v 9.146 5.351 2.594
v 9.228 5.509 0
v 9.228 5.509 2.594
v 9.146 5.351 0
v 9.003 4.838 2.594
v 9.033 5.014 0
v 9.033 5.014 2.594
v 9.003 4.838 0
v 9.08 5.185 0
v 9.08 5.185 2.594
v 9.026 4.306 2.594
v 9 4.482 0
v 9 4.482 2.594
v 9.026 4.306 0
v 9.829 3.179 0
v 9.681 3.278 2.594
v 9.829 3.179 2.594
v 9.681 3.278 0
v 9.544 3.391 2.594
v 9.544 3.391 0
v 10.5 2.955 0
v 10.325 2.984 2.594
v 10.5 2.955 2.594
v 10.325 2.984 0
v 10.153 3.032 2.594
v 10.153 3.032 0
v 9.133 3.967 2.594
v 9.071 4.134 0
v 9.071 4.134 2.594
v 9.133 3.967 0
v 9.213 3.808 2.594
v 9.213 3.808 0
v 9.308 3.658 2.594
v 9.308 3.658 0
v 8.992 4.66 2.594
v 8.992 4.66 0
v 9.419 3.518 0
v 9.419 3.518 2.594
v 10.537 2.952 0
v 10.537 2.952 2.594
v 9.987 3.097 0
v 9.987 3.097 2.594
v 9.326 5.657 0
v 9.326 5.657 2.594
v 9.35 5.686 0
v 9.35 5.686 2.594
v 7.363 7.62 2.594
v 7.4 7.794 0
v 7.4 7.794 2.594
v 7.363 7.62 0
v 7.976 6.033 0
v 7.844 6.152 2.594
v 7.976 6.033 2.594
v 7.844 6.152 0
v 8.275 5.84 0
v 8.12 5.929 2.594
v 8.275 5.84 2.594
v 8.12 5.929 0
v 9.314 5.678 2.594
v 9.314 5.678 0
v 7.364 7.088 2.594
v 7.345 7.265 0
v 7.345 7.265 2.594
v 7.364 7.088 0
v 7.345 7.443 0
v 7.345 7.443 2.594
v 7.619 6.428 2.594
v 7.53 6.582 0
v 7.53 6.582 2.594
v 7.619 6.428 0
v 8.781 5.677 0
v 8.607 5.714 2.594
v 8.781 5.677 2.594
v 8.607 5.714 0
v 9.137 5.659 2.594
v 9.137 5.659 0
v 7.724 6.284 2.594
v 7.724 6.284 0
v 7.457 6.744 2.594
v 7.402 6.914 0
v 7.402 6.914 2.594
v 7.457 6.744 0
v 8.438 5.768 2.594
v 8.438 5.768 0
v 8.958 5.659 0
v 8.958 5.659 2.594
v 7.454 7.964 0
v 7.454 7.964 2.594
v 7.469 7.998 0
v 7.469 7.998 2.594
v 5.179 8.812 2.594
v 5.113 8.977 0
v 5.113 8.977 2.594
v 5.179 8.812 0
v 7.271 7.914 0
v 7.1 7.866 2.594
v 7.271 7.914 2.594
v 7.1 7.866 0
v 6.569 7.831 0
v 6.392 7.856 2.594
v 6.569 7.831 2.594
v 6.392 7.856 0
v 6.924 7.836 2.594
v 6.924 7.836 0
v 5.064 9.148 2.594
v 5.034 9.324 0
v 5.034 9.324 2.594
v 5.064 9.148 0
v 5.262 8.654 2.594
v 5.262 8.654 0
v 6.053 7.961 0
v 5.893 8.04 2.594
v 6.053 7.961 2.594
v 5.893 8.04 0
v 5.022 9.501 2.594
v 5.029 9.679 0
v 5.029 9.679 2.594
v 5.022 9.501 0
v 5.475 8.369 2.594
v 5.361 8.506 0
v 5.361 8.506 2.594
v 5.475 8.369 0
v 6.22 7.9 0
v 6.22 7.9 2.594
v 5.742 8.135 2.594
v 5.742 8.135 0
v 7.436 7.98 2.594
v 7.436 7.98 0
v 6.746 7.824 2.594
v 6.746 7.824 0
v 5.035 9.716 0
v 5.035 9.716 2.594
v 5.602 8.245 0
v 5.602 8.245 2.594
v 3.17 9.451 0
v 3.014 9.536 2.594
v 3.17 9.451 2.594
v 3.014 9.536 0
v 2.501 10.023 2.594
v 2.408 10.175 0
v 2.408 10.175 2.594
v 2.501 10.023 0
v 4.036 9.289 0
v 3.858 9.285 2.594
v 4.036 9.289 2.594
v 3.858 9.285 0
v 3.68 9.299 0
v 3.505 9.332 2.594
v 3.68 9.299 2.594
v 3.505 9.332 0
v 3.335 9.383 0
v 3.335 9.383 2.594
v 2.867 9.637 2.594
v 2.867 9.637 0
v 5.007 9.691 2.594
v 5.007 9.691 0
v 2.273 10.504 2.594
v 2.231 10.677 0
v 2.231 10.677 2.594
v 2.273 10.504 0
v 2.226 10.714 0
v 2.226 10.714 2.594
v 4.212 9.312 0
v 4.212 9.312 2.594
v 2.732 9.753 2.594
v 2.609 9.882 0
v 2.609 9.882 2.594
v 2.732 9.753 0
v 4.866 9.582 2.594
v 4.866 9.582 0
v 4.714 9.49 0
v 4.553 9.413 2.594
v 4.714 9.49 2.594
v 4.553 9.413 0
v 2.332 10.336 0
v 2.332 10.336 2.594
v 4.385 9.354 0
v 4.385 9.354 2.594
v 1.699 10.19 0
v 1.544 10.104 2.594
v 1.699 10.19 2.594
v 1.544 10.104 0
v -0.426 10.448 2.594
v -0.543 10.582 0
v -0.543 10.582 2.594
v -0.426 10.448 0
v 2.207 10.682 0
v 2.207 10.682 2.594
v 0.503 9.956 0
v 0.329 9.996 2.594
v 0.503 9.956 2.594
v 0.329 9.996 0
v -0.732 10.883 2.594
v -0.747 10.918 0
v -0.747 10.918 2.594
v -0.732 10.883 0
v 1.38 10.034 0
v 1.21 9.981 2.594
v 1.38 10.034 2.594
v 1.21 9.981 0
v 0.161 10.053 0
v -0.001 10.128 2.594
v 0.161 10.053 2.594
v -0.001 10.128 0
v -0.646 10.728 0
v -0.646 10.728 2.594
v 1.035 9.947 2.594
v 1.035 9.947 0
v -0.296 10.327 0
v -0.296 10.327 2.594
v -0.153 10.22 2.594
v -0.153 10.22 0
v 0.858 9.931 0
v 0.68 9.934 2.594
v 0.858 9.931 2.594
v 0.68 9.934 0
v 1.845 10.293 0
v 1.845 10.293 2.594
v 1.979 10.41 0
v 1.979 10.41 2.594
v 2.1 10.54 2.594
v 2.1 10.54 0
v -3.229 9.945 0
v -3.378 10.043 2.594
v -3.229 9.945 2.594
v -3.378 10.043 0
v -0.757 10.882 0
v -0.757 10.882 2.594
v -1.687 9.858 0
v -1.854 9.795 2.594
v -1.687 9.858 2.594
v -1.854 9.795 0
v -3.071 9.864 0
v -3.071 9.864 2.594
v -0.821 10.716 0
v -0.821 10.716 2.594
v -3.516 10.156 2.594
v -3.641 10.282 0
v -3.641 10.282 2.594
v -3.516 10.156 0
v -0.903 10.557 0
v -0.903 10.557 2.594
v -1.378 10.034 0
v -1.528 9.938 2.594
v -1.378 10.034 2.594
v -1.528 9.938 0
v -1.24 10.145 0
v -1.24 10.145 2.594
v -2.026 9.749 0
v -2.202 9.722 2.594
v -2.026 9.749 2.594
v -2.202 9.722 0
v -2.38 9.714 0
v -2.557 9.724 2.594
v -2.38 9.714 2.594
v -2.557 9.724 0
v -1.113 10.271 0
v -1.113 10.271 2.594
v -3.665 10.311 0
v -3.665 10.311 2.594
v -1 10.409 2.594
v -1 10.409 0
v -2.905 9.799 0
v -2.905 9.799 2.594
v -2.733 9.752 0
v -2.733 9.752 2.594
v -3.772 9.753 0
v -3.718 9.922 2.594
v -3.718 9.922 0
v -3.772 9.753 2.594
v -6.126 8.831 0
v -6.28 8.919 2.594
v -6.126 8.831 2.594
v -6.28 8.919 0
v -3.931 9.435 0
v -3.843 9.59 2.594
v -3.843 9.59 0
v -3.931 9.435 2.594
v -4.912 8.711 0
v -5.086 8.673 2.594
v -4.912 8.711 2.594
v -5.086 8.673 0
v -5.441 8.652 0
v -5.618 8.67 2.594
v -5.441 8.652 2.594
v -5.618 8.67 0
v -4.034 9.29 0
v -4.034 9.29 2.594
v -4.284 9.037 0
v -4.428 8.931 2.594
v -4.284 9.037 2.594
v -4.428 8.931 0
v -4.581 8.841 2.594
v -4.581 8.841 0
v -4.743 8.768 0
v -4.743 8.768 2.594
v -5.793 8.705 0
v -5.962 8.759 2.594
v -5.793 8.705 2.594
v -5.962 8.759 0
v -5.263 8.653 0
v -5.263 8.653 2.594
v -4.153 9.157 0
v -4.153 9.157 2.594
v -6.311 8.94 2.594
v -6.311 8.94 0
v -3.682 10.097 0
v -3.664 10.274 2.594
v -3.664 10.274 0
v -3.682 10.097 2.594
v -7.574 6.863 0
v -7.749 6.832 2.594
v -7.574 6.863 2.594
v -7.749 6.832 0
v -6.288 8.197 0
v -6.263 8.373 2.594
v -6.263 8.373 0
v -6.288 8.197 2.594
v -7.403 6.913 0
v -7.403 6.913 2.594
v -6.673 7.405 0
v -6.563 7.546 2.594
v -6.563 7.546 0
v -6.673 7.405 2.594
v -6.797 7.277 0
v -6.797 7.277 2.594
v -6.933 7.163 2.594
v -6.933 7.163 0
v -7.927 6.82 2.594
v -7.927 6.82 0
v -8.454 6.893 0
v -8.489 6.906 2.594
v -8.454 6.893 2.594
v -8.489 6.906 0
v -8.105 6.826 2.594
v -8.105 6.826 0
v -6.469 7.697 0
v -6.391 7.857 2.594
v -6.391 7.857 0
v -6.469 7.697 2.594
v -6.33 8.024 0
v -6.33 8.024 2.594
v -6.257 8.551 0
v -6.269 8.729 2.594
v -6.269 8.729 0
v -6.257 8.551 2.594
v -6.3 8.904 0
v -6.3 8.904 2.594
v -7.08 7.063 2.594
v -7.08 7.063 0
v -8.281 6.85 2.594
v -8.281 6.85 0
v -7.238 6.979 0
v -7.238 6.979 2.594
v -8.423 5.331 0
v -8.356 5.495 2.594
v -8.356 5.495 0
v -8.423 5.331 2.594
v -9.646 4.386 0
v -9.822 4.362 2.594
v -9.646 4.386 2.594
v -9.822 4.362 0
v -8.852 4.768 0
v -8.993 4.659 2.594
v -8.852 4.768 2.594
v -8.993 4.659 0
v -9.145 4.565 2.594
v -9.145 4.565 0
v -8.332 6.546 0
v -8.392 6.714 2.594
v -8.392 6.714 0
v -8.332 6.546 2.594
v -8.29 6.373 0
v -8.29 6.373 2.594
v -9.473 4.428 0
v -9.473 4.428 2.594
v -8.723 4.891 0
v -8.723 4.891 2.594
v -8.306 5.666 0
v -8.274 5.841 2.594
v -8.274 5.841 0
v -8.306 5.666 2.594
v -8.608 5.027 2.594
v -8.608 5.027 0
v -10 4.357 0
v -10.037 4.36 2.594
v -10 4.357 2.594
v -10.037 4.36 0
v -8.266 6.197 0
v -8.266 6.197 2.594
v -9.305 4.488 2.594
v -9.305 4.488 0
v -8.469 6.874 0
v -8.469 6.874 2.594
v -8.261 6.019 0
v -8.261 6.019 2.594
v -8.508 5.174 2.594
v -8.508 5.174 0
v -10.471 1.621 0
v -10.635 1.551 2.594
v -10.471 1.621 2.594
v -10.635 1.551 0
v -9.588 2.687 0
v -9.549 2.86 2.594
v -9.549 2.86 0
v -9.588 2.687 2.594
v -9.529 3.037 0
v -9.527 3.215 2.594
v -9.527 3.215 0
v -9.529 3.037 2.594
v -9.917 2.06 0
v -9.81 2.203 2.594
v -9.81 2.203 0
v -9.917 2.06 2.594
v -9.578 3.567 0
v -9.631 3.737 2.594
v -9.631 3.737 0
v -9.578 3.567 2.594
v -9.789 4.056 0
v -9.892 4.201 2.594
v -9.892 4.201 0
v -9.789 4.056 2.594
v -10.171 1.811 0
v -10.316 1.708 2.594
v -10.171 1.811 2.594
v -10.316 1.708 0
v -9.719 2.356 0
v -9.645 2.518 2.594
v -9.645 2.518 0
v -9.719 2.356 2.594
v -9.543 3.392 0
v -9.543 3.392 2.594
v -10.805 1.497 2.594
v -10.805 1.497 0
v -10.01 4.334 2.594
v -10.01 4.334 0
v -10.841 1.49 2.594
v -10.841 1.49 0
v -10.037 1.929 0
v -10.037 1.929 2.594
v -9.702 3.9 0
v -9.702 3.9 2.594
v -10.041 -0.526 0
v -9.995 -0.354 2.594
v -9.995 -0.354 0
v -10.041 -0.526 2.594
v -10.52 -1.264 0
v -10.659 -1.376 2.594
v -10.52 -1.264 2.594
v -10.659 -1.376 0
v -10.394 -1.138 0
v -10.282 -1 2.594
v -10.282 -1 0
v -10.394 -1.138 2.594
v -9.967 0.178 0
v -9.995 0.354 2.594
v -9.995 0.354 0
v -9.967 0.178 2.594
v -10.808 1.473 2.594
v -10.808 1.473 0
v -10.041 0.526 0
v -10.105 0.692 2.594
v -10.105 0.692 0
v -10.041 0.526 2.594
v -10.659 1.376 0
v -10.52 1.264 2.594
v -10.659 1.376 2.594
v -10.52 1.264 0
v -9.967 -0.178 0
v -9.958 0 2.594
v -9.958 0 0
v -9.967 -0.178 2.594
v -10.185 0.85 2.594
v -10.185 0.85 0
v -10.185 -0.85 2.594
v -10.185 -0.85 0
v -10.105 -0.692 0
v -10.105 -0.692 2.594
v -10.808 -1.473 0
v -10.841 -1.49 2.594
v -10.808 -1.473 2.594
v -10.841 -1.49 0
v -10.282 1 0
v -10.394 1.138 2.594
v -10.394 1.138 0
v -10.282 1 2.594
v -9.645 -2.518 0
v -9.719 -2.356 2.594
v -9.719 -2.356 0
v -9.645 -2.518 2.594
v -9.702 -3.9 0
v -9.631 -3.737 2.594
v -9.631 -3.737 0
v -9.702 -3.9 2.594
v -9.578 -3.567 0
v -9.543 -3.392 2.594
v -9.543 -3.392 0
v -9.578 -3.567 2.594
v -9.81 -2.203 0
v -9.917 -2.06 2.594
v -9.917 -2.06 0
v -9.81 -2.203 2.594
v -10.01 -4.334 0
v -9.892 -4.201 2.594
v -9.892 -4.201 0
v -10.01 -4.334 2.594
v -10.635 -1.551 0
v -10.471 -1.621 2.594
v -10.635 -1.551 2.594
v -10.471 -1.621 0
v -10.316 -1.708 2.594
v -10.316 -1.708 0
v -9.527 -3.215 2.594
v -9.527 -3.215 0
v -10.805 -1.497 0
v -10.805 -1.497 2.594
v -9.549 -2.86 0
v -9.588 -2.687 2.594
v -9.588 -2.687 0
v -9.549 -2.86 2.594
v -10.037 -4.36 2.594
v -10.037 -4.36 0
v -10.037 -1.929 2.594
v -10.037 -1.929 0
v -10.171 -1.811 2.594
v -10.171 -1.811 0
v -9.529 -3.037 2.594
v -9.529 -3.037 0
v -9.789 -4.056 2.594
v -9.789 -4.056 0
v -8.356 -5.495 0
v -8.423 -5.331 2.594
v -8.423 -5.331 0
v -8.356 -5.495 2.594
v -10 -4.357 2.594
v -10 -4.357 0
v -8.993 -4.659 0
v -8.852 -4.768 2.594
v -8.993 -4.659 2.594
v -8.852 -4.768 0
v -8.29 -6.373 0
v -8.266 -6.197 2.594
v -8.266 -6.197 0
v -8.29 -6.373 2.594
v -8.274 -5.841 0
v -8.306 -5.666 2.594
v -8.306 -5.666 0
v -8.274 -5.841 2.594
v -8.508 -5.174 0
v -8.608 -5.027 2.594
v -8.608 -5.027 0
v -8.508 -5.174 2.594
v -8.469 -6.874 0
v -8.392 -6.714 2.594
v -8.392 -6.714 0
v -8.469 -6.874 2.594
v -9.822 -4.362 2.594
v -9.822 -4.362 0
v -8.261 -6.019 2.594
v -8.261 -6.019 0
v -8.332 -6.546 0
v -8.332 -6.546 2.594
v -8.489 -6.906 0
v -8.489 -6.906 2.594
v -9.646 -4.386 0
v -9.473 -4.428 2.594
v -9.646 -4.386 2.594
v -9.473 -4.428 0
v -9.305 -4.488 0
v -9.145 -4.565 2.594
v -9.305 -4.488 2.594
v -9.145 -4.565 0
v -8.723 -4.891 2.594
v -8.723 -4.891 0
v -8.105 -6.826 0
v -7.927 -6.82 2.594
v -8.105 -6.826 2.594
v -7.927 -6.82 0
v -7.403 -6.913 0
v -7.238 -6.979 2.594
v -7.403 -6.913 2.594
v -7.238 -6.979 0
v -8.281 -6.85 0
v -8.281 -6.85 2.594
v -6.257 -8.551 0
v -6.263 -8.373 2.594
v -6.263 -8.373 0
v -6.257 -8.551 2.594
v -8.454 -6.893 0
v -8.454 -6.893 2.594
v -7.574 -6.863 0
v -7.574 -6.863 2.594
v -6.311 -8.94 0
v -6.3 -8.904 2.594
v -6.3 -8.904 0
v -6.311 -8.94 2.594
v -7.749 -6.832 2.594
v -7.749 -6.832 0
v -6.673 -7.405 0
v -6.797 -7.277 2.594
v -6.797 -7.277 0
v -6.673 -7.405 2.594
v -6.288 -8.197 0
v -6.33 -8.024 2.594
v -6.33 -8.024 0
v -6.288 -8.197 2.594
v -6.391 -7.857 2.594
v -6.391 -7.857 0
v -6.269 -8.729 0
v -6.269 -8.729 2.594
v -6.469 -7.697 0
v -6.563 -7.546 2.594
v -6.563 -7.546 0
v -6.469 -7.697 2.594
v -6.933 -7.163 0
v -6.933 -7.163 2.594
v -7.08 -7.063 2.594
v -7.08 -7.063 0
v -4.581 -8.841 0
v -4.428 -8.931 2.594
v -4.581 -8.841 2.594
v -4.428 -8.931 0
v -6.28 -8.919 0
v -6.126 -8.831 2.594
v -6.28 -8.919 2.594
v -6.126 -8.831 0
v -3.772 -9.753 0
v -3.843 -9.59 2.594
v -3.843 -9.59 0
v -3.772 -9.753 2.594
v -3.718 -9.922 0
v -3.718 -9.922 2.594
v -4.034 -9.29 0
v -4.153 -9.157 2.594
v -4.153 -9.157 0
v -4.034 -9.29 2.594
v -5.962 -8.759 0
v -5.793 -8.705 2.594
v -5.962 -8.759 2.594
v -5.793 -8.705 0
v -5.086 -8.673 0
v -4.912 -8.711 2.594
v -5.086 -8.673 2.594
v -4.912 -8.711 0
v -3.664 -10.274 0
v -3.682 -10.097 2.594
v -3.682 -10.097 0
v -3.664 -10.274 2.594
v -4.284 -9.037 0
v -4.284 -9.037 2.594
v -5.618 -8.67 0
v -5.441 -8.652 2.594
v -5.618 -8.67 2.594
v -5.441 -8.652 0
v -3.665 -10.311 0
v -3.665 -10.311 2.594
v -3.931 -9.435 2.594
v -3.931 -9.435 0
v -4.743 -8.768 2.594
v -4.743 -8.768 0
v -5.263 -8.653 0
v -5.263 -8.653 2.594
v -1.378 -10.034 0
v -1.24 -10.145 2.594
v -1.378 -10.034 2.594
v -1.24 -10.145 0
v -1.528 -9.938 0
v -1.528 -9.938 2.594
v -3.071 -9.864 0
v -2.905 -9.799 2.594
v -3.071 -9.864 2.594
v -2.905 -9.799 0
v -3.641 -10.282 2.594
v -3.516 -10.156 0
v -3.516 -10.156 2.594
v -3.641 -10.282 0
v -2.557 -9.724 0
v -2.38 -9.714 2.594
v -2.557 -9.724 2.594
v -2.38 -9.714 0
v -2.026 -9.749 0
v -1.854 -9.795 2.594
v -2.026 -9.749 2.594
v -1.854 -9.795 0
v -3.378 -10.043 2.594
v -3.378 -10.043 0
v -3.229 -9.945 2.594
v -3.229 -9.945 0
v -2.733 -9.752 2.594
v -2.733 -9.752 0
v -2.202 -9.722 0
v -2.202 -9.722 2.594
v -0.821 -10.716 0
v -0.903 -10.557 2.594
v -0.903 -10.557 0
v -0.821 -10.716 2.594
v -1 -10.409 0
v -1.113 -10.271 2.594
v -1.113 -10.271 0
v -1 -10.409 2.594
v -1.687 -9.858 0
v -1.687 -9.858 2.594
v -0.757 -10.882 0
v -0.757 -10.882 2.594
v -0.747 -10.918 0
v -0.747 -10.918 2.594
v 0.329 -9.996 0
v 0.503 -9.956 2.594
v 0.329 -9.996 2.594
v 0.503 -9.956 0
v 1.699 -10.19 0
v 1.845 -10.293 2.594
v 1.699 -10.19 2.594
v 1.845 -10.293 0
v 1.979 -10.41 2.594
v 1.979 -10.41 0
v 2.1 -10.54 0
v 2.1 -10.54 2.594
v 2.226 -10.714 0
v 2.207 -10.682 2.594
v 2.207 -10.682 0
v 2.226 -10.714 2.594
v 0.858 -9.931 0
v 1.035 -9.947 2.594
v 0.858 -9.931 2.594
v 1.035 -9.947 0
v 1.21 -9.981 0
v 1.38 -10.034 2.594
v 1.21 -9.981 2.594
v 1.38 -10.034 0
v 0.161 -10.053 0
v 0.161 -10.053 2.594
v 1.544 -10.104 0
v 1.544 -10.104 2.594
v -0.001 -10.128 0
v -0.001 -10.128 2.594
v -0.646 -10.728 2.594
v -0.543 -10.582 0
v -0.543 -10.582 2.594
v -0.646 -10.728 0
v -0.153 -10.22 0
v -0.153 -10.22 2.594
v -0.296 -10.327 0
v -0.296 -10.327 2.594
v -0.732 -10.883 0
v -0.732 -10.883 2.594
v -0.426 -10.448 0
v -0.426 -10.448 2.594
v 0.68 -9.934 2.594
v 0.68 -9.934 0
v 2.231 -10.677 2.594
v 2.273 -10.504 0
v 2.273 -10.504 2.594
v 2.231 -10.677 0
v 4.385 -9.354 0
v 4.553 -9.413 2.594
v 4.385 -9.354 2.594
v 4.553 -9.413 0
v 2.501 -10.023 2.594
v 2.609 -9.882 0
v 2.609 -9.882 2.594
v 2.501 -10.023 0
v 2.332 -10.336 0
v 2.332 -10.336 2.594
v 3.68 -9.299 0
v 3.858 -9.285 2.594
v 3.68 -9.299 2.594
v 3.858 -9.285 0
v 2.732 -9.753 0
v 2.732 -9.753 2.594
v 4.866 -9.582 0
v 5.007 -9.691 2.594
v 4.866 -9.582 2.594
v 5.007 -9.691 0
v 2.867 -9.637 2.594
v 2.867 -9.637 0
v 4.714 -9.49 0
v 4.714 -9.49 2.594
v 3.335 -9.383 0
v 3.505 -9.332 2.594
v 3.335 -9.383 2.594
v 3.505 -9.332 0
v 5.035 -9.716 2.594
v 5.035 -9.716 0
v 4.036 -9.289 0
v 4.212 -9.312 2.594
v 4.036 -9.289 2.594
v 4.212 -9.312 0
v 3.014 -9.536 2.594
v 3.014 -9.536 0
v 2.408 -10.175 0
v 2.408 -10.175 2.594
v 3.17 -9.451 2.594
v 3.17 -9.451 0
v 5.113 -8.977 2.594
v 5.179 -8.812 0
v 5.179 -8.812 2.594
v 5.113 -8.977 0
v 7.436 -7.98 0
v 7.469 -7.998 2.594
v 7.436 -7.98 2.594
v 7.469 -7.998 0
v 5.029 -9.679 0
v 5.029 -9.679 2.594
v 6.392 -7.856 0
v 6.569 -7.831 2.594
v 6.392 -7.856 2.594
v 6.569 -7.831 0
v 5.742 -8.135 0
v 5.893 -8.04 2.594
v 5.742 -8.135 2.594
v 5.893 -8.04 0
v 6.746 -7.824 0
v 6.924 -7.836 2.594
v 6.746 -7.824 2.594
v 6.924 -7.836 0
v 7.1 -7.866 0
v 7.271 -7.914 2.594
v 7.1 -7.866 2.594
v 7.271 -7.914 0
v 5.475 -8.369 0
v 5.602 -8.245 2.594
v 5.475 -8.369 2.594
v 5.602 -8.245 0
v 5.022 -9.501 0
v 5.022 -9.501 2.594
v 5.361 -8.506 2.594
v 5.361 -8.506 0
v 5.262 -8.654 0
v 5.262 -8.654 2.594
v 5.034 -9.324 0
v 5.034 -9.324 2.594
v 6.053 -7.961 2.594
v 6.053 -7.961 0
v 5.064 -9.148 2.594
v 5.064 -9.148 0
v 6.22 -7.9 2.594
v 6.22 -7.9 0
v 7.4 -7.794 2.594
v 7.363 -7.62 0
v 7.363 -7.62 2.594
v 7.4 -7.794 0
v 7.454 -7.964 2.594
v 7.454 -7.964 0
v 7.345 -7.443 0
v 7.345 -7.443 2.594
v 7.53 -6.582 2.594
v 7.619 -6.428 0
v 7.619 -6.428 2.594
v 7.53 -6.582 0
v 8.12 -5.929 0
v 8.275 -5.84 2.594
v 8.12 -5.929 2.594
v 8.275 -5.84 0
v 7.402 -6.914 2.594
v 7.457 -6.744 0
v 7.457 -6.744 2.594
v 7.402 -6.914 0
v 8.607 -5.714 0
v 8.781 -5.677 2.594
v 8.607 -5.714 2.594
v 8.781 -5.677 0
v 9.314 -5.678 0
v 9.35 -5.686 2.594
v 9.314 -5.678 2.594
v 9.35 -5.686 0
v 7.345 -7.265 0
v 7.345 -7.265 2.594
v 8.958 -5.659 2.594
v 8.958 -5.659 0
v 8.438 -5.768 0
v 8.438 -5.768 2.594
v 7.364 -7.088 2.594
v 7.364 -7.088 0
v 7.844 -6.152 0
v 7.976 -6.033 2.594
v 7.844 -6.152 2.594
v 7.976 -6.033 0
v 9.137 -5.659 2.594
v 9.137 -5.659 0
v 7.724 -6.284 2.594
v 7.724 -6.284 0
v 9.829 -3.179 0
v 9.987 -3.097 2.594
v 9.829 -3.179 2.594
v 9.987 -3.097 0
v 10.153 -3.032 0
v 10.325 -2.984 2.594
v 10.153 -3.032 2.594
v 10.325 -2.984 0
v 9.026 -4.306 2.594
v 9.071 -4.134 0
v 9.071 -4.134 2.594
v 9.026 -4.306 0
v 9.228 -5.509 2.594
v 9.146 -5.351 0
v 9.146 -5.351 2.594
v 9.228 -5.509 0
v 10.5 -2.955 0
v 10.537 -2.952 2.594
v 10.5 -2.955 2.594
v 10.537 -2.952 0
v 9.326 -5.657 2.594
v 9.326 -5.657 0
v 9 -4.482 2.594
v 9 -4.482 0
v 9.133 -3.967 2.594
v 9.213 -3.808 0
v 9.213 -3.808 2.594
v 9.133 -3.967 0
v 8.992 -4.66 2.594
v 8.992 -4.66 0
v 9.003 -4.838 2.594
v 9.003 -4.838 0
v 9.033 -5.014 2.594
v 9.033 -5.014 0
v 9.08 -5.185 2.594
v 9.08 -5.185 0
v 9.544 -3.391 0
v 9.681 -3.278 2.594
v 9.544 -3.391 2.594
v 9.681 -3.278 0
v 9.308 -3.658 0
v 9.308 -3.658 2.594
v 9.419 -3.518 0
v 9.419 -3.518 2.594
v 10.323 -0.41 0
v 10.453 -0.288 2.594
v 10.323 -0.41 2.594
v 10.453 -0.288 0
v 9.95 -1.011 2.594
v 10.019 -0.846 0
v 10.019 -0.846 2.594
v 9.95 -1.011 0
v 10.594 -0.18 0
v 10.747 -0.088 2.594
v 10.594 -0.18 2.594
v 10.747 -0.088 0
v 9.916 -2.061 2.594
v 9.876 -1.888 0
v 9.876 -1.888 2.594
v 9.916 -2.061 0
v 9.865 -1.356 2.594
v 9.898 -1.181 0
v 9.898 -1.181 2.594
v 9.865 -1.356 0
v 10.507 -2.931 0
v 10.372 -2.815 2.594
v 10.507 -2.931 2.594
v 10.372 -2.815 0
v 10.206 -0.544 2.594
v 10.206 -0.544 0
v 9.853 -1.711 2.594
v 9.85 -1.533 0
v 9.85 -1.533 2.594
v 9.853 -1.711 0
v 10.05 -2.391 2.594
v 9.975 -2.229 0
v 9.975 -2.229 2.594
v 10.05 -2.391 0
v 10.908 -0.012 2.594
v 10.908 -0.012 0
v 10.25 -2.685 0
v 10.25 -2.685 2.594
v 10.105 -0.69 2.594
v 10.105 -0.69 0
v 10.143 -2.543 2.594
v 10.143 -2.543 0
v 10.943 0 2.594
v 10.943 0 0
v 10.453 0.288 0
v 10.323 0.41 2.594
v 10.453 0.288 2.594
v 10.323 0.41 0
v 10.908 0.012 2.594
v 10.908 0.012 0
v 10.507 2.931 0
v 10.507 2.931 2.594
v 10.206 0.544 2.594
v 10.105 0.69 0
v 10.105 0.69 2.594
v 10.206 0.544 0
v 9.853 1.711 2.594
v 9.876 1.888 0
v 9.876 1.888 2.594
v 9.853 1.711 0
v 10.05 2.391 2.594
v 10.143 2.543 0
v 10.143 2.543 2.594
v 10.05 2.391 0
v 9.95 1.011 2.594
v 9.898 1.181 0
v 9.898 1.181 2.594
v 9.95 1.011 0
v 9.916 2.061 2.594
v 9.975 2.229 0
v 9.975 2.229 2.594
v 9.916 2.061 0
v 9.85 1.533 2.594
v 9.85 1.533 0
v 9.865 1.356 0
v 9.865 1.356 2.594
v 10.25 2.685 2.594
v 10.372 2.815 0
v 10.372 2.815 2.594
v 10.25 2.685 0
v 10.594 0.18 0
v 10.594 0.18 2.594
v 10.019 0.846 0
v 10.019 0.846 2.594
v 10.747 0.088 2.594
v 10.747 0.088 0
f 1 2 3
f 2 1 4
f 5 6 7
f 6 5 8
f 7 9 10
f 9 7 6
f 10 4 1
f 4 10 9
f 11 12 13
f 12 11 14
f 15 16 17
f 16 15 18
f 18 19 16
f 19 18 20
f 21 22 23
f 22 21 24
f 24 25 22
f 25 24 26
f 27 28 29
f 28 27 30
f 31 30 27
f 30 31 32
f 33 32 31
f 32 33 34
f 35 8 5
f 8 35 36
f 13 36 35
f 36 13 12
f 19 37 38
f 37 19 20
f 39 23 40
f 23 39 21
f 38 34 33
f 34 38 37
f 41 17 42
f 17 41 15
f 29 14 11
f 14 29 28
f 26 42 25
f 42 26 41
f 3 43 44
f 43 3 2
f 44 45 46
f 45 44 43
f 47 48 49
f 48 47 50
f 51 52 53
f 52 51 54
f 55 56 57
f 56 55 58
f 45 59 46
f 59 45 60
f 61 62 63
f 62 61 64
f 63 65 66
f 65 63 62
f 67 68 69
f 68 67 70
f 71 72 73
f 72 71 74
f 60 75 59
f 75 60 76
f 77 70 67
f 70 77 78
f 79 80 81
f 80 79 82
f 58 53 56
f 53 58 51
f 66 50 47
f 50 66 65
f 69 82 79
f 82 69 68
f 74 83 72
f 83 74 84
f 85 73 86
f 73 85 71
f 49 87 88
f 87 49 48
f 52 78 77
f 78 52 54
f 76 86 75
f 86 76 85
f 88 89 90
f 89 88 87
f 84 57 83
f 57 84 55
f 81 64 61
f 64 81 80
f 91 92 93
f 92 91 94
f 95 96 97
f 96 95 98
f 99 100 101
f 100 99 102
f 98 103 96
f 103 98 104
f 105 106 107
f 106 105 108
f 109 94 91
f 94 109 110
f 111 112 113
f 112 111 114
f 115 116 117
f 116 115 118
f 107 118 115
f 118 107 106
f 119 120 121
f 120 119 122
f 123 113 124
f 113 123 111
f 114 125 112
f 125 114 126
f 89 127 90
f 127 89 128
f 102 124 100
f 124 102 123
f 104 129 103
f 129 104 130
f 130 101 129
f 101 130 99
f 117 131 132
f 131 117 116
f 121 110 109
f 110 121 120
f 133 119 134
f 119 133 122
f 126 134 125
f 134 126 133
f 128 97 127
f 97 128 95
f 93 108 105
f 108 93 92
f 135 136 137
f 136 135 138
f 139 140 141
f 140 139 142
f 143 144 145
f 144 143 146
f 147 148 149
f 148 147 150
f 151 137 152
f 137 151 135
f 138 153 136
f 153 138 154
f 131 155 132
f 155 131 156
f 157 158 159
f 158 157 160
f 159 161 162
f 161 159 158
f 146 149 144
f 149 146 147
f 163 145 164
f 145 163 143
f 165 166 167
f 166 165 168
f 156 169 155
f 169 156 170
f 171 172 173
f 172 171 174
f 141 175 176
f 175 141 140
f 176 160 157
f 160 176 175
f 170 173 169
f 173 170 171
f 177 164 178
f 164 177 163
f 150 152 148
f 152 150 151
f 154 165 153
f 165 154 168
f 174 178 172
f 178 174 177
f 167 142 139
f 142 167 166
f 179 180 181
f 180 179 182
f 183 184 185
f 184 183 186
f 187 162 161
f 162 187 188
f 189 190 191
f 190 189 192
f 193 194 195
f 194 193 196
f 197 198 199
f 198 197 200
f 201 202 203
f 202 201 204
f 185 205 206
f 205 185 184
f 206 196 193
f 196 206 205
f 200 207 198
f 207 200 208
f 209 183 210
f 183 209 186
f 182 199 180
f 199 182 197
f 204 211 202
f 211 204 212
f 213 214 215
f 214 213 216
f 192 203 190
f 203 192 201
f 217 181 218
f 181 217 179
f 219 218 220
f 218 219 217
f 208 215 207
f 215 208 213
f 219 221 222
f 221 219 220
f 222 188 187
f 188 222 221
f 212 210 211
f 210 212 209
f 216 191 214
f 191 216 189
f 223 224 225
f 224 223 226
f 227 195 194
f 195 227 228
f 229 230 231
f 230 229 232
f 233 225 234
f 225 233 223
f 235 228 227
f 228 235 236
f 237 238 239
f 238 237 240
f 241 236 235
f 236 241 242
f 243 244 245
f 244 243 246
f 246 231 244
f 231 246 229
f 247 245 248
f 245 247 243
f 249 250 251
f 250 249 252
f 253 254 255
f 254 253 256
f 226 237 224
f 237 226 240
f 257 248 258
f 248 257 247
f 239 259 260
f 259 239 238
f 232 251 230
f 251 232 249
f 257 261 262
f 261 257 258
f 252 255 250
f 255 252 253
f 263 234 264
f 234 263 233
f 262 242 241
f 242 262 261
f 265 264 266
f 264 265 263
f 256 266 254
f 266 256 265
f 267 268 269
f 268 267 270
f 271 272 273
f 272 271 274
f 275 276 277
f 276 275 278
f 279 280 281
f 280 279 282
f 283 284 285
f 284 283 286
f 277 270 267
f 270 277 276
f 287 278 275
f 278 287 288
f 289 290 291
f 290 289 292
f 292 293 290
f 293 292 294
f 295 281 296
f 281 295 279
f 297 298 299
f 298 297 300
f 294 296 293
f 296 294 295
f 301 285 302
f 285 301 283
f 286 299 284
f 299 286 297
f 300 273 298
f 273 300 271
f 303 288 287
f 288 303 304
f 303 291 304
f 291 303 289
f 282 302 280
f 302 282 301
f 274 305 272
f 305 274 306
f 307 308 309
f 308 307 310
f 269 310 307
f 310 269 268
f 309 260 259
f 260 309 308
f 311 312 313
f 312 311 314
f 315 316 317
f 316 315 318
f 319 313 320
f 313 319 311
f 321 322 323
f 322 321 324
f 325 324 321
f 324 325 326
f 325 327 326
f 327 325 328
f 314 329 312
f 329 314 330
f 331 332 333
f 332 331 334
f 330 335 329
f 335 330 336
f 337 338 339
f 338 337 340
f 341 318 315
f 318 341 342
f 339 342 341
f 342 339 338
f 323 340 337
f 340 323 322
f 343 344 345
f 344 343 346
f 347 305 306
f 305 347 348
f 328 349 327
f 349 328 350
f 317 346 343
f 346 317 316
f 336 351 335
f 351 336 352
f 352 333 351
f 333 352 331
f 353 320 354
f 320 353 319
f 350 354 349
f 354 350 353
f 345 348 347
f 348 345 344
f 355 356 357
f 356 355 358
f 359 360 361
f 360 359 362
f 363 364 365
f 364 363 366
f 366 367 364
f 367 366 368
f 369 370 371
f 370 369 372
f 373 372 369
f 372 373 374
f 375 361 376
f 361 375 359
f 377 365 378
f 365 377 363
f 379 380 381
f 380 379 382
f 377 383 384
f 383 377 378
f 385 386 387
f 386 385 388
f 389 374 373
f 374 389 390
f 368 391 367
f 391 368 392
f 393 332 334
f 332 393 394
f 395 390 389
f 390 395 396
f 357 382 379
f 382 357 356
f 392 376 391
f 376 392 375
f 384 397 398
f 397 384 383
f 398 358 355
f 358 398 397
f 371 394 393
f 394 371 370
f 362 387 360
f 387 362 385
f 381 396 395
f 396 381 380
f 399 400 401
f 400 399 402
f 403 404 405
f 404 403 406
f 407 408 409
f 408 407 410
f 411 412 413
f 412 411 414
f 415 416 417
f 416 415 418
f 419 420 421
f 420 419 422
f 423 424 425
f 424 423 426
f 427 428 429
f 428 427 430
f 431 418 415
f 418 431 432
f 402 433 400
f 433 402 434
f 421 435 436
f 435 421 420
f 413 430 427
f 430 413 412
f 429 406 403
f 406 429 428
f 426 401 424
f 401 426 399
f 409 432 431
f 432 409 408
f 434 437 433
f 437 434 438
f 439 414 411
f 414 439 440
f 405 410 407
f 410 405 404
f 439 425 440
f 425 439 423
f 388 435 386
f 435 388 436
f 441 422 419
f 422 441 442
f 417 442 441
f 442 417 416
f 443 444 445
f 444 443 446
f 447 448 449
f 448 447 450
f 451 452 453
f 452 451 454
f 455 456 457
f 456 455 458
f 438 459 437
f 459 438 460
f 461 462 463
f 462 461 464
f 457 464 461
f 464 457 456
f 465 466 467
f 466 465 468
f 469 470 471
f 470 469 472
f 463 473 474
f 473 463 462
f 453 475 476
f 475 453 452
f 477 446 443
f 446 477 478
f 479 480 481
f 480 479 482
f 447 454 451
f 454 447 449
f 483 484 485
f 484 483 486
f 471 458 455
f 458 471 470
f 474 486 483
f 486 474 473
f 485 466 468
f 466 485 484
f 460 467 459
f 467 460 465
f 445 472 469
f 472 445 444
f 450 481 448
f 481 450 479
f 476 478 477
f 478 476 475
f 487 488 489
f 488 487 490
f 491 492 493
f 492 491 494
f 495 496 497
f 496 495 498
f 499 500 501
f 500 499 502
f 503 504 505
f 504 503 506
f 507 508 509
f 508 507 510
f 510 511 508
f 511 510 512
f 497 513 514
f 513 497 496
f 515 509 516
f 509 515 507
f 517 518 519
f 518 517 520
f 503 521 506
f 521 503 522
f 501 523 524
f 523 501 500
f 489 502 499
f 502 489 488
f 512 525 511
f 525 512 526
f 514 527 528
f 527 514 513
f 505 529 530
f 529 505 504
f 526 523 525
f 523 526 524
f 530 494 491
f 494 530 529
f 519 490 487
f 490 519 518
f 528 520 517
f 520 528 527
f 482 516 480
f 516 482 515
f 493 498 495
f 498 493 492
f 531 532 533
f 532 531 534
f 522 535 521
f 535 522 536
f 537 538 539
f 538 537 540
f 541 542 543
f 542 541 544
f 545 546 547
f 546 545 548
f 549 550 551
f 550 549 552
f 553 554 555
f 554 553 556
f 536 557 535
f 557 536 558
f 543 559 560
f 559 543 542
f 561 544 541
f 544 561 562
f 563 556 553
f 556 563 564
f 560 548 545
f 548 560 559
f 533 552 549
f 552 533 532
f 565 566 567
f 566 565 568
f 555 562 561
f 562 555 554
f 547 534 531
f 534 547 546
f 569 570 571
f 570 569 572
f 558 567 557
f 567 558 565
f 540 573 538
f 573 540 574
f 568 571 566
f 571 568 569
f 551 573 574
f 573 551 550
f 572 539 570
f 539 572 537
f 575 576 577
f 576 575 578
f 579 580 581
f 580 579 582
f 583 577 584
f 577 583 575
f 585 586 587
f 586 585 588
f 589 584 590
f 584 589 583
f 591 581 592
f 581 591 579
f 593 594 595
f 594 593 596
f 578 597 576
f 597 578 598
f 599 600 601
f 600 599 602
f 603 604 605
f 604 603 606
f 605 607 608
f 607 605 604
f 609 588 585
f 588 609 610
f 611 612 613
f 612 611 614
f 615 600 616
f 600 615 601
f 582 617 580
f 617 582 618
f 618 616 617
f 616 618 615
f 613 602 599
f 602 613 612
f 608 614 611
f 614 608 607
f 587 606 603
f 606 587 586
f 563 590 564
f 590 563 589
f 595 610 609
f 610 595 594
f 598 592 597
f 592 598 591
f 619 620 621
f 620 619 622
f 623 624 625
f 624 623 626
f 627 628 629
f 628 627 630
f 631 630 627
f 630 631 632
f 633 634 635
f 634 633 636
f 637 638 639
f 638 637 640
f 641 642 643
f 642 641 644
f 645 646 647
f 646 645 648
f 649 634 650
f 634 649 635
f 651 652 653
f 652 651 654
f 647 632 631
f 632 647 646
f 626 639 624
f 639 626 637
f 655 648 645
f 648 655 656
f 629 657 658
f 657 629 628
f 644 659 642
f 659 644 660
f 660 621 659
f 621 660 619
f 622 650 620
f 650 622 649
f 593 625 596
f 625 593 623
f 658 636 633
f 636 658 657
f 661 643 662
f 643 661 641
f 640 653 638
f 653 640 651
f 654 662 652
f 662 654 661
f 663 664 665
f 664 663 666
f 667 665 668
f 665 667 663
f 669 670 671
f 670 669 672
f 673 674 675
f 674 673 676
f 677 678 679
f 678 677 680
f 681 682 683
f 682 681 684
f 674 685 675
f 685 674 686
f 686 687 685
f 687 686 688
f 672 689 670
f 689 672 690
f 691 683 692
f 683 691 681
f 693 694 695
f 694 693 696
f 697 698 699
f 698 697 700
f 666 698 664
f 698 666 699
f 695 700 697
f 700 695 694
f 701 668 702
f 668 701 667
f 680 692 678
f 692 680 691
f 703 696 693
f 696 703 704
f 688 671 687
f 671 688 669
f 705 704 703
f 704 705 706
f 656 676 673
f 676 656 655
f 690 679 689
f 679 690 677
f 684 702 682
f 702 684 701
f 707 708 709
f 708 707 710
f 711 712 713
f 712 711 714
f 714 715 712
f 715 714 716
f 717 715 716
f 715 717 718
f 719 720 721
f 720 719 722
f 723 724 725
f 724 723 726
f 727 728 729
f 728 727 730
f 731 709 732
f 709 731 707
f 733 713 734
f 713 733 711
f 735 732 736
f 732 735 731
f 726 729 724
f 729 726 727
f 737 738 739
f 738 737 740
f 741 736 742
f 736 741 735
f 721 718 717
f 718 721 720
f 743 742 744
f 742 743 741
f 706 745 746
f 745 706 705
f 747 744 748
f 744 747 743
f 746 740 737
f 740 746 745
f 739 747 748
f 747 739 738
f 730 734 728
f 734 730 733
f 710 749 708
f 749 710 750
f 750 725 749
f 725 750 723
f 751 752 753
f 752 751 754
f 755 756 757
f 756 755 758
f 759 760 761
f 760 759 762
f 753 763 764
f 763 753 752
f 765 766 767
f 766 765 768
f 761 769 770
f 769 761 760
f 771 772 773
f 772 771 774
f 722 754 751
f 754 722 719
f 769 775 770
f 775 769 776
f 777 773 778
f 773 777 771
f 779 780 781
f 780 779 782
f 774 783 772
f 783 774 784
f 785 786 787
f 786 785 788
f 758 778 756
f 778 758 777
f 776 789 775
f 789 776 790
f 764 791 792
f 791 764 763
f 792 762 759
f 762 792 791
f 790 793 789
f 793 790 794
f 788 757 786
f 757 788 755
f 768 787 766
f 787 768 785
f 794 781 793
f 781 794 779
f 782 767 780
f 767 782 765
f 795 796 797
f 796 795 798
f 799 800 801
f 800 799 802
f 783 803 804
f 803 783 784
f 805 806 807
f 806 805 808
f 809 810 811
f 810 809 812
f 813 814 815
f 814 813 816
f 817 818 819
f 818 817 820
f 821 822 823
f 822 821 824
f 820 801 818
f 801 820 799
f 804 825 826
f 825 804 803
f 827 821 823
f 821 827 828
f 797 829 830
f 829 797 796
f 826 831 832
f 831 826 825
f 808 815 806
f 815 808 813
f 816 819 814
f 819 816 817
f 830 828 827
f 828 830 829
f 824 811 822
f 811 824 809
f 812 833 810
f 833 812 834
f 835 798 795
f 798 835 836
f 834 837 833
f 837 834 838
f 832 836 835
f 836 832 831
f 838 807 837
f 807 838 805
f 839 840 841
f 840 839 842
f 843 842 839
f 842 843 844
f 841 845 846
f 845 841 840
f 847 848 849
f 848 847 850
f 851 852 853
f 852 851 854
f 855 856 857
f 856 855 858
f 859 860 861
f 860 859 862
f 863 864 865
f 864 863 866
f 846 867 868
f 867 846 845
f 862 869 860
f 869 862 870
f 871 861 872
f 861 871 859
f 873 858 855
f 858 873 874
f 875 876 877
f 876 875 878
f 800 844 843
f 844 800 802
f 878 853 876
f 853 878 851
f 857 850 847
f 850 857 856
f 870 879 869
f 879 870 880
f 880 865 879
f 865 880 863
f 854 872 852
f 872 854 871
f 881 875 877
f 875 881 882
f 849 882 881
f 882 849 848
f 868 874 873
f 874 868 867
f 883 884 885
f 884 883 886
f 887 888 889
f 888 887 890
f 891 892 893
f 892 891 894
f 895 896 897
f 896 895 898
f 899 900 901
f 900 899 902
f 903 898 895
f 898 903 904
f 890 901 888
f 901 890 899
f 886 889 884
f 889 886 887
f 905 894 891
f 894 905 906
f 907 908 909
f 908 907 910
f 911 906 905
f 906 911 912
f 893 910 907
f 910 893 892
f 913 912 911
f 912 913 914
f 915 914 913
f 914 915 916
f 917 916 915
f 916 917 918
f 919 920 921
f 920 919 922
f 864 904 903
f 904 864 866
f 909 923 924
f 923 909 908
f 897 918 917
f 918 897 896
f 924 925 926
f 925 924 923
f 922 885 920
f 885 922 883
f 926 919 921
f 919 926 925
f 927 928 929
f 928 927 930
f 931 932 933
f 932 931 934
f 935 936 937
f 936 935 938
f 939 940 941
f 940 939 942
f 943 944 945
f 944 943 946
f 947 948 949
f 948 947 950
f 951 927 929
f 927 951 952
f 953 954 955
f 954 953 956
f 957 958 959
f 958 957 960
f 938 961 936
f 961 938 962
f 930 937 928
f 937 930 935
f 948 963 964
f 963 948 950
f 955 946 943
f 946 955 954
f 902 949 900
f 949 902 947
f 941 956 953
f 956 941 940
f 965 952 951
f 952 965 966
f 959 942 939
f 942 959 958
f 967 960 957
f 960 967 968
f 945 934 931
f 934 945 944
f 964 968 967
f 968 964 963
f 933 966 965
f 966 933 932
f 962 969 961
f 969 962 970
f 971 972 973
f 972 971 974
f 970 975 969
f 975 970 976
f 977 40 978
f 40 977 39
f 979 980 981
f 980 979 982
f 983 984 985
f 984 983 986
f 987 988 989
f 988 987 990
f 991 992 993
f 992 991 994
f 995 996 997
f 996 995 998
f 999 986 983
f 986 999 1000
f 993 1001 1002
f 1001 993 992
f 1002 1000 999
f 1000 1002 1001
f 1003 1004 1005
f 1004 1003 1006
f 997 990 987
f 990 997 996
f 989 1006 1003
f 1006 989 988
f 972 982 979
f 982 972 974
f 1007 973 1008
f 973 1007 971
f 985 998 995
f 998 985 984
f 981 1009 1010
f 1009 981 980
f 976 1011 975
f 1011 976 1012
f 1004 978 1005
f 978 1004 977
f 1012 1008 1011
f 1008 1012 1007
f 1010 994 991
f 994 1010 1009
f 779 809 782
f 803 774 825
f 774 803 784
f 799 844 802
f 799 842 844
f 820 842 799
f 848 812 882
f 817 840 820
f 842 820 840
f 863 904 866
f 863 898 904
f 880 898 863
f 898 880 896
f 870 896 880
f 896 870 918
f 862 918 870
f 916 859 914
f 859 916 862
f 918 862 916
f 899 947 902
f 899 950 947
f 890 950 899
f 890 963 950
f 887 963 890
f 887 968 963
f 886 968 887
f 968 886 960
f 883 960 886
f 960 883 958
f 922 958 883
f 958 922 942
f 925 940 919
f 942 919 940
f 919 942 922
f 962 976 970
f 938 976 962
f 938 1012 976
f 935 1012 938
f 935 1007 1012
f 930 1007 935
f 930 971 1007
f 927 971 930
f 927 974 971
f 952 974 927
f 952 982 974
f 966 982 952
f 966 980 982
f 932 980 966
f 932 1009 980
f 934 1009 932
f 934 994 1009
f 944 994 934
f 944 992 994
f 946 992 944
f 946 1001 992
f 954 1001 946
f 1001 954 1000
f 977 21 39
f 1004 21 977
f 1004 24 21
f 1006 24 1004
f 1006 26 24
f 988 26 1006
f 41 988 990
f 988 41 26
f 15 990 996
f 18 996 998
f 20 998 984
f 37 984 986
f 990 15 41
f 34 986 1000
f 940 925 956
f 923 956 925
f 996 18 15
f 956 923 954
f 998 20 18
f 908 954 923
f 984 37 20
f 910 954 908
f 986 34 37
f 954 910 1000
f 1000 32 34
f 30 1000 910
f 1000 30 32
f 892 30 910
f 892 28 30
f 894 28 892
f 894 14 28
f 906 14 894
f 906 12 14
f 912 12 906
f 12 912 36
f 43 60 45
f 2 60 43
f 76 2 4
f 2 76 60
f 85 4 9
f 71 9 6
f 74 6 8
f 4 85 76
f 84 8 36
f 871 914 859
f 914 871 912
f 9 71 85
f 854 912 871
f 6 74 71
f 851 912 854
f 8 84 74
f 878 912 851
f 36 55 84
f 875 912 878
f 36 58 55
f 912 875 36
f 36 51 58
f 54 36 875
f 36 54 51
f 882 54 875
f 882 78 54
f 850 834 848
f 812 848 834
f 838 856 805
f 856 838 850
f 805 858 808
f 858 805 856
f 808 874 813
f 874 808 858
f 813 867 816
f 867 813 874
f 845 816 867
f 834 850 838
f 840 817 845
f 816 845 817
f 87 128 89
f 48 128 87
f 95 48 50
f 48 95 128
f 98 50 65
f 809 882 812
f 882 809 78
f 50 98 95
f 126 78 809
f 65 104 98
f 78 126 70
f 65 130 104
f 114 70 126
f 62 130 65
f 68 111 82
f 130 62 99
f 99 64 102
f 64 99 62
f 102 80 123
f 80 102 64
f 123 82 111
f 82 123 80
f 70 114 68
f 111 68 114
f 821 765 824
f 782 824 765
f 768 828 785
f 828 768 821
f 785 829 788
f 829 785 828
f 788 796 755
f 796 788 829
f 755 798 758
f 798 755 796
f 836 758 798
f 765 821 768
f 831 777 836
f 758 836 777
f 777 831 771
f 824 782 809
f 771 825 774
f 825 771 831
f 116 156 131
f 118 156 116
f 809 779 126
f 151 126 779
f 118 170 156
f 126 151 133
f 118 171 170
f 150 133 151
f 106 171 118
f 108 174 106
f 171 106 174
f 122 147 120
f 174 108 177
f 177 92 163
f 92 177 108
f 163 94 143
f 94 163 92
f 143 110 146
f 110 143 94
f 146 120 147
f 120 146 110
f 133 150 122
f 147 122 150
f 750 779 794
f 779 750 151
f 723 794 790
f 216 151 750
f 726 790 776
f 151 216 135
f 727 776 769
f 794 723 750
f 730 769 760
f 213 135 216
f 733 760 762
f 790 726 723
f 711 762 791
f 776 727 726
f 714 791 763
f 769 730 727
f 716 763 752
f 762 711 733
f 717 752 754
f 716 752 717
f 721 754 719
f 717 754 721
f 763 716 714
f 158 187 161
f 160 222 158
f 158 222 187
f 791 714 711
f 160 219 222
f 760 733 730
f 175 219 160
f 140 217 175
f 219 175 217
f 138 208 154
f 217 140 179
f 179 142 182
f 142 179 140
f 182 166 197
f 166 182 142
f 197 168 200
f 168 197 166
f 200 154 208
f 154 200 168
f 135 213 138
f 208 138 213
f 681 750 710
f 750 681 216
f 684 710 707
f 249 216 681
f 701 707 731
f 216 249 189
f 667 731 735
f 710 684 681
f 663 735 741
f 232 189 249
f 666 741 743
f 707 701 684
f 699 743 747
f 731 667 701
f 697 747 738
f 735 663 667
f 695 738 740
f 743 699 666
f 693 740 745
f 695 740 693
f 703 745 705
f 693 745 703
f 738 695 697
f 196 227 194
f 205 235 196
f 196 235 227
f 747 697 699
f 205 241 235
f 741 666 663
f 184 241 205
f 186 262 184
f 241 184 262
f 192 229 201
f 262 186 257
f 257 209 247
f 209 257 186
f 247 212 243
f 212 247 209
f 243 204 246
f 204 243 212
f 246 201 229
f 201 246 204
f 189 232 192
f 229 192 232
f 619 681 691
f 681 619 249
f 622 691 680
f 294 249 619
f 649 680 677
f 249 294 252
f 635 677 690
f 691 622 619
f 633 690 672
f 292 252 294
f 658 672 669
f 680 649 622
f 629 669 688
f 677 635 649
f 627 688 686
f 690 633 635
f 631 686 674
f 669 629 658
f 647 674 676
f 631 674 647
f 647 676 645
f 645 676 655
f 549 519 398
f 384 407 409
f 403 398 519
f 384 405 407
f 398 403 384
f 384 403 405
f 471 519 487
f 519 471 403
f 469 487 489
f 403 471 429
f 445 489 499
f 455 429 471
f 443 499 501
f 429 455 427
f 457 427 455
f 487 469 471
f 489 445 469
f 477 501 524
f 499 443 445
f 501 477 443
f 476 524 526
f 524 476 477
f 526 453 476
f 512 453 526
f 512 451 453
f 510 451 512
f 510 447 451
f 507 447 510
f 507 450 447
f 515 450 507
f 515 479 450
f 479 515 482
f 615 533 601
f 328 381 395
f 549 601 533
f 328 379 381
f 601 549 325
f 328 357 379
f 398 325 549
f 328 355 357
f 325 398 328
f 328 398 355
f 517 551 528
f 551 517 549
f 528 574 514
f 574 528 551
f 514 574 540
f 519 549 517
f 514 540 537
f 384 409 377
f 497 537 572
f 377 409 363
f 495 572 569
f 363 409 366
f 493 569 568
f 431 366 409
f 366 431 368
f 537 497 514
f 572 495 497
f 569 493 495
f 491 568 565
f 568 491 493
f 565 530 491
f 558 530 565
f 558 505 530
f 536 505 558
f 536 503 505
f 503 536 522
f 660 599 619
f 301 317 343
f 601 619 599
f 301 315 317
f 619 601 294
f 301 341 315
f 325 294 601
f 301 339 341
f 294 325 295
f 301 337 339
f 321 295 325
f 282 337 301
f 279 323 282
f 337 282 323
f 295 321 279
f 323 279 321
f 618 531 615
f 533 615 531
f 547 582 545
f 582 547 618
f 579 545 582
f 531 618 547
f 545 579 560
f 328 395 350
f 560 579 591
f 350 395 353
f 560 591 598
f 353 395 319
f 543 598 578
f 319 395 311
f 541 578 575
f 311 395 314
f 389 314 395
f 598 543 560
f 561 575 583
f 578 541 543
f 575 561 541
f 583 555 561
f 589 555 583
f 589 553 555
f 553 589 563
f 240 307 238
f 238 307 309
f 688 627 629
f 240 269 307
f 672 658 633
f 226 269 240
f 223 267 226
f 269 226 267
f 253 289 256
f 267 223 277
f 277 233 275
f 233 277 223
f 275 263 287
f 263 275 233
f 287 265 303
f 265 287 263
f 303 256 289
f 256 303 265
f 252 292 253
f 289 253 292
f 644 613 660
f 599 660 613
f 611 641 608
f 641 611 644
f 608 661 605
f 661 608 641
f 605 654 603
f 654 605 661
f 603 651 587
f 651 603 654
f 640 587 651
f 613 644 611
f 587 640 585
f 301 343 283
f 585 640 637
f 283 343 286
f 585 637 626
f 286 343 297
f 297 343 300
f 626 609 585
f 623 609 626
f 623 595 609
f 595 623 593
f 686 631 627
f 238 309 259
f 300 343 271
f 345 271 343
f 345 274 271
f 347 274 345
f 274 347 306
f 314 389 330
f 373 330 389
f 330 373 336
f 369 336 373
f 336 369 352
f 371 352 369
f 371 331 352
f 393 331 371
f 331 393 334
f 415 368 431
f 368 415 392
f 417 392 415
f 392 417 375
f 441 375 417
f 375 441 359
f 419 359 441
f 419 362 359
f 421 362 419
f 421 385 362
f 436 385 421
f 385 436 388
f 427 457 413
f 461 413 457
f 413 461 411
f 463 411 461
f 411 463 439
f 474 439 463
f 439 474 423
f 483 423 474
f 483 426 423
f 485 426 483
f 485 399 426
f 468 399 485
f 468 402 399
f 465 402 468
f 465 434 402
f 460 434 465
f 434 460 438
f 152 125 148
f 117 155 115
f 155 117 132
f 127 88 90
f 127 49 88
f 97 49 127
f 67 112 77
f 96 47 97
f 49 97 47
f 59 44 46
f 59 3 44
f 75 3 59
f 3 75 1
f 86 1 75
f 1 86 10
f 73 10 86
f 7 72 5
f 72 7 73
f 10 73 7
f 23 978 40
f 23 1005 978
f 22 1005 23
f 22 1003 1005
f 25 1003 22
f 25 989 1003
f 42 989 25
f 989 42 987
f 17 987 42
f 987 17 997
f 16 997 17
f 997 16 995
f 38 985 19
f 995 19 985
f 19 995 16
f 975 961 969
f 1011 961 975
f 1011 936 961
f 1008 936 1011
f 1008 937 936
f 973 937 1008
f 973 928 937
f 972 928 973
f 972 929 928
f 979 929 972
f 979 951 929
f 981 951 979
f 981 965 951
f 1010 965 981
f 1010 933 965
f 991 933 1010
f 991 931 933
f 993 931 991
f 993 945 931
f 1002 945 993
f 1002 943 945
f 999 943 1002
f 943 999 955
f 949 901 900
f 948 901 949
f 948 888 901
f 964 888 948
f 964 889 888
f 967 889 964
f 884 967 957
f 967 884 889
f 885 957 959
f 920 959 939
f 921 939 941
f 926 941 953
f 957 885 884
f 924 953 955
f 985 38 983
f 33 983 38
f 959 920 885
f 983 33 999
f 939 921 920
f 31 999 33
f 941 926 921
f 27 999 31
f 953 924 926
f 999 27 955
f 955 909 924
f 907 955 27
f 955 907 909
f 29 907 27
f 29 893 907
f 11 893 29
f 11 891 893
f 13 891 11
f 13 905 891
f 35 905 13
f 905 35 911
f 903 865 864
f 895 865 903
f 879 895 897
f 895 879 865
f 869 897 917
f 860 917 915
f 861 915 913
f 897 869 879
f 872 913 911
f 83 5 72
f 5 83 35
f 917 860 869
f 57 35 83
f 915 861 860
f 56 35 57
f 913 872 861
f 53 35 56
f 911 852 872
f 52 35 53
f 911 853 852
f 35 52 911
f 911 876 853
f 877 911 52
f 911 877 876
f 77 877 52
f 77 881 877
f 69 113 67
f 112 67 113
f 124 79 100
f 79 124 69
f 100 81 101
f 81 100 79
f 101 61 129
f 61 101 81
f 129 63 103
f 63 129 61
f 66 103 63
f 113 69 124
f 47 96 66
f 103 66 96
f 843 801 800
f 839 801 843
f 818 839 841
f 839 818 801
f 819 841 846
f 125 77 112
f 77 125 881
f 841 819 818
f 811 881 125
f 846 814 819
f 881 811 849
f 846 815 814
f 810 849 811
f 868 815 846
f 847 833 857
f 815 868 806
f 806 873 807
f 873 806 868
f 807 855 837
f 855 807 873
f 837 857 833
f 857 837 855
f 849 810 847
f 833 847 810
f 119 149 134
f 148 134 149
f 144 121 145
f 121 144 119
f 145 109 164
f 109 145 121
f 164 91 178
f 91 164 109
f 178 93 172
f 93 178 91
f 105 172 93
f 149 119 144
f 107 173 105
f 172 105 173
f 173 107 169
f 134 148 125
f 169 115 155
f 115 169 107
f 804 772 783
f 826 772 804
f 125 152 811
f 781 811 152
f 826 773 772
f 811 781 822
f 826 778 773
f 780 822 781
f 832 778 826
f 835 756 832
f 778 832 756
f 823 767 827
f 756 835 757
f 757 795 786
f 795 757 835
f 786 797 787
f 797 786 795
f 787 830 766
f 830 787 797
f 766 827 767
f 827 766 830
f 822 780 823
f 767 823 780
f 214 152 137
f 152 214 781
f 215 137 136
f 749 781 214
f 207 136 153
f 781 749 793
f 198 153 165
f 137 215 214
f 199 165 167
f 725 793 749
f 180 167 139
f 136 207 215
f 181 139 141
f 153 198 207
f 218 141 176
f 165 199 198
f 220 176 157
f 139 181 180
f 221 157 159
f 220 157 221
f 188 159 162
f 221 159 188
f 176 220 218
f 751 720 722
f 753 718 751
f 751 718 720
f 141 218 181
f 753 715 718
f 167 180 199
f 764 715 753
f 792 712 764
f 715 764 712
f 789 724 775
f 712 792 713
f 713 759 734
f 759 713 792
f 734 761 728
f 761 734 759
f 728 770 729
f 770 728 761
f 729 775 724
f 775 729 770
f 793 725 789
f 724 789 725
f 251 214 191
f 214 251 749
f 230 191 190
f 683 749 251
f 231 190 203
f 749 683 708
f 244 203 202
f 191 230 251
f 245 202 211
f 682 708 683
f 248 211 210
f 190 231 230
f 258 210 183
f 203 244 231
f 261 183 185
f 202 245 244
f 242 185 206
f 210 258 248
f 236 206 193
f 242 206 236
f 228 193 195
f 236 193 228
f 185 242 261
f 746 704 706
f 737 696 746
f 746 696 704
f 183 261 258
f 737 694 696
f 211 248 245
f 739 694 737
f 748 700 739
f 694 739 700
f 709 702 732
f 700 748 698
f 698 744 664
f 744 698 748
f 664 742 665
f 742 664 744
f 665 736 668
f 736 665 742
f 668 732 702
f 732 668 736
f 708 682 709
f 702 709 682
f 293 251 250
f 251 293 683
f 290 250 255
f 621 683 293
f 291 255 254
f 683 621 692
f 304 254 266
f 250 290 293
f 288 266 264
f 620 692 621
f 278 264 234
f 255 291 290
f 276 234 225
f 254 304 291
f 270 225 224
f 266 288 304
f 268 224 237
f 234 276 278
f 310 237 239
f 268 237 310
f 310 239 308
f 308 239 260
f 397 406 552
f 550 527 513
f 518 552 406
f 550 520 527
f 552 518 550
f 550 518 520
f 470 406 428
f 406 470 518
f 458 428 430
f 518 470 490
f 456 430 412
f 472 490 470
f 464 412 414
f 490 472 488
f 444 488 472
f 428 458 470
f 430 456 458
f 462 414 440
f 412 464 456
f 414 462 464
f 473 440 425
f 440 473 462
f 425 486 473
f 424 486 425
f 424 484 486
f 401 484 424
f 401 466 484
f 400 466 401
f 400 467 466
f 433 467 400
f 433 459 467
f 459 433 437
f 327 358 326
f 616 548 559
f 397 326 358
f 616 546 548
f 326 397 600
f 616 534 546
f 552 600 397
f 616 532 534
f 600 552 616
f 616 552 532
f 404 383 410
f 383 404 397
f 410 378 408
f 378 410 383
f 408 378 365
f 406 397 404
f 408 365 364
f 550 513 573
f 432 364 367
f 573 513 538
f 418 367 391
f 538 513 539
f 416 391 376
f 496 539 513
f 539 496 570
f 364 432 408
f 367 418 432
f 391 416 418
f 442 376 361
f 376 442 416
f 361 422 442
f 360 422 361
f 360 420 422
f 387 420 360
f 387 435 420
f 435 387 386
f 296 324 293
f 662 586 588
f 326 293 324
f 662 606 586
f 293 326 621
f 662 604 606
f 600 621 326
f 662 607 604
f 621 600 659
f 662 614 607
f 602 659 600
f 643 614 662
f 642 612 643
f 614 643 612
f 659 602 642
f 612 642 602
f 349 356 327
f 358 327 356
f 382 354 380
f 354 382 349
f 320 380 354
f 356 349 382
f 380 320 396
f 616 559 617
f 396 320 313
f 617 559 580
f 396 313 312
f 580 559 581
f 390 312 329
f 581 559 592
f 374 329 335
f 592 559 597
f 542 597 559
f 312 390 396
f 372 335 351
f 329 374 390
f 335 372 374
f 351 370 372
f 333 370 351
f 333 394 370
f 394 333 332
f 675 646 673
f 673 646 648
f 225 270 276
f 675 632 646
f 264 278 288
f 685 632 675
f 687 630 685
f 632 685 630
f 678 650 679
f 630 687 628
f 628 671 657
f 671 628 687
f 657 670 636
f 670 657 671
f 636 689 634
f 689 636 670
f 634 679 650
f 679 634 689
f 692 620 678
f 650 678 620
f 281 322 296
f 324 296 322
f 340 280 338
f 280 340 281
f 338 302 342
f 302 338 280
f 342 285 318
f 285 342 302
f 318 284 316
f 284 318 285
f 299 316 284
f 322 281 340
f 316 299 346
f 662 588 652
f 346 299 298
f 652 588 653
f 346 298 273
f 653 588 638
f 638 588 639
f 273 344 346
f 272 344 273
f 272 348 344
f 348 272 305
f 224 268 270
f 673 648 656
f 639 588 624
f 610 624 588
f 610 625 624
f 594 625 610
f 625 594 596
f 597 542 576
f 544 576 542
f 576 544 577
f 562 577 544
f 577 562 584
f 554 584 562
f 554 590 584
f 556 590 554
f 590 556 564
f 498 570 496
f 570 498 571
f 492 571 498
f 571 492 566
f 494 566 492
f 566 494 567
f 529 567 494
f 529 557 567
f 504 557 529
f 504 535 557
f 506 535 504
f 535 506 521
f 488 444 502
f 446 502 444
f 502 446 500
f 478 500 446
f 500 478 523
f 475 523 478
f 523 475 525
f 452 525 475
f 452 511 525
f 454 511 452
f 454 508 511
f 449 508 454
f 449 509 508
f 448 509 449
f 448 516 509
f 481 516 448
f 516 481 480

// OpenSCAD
function mm(i) = i*25.4 ;

$fn = 60;

// sprocket(NUMBER OF TEETH, ROLLER DIAMETER, PITCH LENGTH, THICKNESS, TOLERANCE)
module sprocket(teeth=20, roller=3, pitch=17, thickness=3, tolerance=0.2){
	//$fs=0.5;
	roller=roller/2; //We need radius in our calculations, not diameter
	distance_from_center=pitch/(2*sin(180/teeth));
	 echo(distance_from_center); //this just displays the angle below the window

	angle=(360/teeth); 
	pitch_circle=sqrt((distance_from_center*distance_from_center) - (pitch*(roller+tolerance))+((roller+tolerance)*(roller+tolerance)));
	echo(pitch_circle);
	difference(){
		union(){
			cylinder(r=pitch_circle/2,h=thickness);
			for(tooth=[1:teeth]){
				intersection(){
					rotate(a=[0,0,angle*(tooth+0.5)]){
						translate([distance_from_center/2,0,0]){
							cylinder(r=(pitch-roller*2-tolerance*2)/2,h=thickness);
						}
					}
					rotate(a=[0,0,angle*(tooth-0.5)]){
						translate([distance_from_center/2,0,0]){
							cylinder(r=(pitch-roller*2-tolerance*2)/2,h=thickness);
						}
					}
				}
			}
		}
		for(tooth=[1:teeth]){
			rotate(a=[0,0,angle*(tooth+0.5)]){
				translate([distance_from_center/2,0,-1]){
					cylinder(r=roller+tolerance,h=thickness+2);
				}
			}
		}
	}
}

module sprocketNum25(teeth=20){
	sprocket(teeth,mm( .130),mm(1/4),mm(.11)-0.2,0.05);
}

module sprocketNum35(teeth=20){
	sprocket(teeth,mm( .2),mm(3/8),mm(.168)-0.2,0.05);
}

module viewer(){
	sprocketNum25(23);
}

viewer();
